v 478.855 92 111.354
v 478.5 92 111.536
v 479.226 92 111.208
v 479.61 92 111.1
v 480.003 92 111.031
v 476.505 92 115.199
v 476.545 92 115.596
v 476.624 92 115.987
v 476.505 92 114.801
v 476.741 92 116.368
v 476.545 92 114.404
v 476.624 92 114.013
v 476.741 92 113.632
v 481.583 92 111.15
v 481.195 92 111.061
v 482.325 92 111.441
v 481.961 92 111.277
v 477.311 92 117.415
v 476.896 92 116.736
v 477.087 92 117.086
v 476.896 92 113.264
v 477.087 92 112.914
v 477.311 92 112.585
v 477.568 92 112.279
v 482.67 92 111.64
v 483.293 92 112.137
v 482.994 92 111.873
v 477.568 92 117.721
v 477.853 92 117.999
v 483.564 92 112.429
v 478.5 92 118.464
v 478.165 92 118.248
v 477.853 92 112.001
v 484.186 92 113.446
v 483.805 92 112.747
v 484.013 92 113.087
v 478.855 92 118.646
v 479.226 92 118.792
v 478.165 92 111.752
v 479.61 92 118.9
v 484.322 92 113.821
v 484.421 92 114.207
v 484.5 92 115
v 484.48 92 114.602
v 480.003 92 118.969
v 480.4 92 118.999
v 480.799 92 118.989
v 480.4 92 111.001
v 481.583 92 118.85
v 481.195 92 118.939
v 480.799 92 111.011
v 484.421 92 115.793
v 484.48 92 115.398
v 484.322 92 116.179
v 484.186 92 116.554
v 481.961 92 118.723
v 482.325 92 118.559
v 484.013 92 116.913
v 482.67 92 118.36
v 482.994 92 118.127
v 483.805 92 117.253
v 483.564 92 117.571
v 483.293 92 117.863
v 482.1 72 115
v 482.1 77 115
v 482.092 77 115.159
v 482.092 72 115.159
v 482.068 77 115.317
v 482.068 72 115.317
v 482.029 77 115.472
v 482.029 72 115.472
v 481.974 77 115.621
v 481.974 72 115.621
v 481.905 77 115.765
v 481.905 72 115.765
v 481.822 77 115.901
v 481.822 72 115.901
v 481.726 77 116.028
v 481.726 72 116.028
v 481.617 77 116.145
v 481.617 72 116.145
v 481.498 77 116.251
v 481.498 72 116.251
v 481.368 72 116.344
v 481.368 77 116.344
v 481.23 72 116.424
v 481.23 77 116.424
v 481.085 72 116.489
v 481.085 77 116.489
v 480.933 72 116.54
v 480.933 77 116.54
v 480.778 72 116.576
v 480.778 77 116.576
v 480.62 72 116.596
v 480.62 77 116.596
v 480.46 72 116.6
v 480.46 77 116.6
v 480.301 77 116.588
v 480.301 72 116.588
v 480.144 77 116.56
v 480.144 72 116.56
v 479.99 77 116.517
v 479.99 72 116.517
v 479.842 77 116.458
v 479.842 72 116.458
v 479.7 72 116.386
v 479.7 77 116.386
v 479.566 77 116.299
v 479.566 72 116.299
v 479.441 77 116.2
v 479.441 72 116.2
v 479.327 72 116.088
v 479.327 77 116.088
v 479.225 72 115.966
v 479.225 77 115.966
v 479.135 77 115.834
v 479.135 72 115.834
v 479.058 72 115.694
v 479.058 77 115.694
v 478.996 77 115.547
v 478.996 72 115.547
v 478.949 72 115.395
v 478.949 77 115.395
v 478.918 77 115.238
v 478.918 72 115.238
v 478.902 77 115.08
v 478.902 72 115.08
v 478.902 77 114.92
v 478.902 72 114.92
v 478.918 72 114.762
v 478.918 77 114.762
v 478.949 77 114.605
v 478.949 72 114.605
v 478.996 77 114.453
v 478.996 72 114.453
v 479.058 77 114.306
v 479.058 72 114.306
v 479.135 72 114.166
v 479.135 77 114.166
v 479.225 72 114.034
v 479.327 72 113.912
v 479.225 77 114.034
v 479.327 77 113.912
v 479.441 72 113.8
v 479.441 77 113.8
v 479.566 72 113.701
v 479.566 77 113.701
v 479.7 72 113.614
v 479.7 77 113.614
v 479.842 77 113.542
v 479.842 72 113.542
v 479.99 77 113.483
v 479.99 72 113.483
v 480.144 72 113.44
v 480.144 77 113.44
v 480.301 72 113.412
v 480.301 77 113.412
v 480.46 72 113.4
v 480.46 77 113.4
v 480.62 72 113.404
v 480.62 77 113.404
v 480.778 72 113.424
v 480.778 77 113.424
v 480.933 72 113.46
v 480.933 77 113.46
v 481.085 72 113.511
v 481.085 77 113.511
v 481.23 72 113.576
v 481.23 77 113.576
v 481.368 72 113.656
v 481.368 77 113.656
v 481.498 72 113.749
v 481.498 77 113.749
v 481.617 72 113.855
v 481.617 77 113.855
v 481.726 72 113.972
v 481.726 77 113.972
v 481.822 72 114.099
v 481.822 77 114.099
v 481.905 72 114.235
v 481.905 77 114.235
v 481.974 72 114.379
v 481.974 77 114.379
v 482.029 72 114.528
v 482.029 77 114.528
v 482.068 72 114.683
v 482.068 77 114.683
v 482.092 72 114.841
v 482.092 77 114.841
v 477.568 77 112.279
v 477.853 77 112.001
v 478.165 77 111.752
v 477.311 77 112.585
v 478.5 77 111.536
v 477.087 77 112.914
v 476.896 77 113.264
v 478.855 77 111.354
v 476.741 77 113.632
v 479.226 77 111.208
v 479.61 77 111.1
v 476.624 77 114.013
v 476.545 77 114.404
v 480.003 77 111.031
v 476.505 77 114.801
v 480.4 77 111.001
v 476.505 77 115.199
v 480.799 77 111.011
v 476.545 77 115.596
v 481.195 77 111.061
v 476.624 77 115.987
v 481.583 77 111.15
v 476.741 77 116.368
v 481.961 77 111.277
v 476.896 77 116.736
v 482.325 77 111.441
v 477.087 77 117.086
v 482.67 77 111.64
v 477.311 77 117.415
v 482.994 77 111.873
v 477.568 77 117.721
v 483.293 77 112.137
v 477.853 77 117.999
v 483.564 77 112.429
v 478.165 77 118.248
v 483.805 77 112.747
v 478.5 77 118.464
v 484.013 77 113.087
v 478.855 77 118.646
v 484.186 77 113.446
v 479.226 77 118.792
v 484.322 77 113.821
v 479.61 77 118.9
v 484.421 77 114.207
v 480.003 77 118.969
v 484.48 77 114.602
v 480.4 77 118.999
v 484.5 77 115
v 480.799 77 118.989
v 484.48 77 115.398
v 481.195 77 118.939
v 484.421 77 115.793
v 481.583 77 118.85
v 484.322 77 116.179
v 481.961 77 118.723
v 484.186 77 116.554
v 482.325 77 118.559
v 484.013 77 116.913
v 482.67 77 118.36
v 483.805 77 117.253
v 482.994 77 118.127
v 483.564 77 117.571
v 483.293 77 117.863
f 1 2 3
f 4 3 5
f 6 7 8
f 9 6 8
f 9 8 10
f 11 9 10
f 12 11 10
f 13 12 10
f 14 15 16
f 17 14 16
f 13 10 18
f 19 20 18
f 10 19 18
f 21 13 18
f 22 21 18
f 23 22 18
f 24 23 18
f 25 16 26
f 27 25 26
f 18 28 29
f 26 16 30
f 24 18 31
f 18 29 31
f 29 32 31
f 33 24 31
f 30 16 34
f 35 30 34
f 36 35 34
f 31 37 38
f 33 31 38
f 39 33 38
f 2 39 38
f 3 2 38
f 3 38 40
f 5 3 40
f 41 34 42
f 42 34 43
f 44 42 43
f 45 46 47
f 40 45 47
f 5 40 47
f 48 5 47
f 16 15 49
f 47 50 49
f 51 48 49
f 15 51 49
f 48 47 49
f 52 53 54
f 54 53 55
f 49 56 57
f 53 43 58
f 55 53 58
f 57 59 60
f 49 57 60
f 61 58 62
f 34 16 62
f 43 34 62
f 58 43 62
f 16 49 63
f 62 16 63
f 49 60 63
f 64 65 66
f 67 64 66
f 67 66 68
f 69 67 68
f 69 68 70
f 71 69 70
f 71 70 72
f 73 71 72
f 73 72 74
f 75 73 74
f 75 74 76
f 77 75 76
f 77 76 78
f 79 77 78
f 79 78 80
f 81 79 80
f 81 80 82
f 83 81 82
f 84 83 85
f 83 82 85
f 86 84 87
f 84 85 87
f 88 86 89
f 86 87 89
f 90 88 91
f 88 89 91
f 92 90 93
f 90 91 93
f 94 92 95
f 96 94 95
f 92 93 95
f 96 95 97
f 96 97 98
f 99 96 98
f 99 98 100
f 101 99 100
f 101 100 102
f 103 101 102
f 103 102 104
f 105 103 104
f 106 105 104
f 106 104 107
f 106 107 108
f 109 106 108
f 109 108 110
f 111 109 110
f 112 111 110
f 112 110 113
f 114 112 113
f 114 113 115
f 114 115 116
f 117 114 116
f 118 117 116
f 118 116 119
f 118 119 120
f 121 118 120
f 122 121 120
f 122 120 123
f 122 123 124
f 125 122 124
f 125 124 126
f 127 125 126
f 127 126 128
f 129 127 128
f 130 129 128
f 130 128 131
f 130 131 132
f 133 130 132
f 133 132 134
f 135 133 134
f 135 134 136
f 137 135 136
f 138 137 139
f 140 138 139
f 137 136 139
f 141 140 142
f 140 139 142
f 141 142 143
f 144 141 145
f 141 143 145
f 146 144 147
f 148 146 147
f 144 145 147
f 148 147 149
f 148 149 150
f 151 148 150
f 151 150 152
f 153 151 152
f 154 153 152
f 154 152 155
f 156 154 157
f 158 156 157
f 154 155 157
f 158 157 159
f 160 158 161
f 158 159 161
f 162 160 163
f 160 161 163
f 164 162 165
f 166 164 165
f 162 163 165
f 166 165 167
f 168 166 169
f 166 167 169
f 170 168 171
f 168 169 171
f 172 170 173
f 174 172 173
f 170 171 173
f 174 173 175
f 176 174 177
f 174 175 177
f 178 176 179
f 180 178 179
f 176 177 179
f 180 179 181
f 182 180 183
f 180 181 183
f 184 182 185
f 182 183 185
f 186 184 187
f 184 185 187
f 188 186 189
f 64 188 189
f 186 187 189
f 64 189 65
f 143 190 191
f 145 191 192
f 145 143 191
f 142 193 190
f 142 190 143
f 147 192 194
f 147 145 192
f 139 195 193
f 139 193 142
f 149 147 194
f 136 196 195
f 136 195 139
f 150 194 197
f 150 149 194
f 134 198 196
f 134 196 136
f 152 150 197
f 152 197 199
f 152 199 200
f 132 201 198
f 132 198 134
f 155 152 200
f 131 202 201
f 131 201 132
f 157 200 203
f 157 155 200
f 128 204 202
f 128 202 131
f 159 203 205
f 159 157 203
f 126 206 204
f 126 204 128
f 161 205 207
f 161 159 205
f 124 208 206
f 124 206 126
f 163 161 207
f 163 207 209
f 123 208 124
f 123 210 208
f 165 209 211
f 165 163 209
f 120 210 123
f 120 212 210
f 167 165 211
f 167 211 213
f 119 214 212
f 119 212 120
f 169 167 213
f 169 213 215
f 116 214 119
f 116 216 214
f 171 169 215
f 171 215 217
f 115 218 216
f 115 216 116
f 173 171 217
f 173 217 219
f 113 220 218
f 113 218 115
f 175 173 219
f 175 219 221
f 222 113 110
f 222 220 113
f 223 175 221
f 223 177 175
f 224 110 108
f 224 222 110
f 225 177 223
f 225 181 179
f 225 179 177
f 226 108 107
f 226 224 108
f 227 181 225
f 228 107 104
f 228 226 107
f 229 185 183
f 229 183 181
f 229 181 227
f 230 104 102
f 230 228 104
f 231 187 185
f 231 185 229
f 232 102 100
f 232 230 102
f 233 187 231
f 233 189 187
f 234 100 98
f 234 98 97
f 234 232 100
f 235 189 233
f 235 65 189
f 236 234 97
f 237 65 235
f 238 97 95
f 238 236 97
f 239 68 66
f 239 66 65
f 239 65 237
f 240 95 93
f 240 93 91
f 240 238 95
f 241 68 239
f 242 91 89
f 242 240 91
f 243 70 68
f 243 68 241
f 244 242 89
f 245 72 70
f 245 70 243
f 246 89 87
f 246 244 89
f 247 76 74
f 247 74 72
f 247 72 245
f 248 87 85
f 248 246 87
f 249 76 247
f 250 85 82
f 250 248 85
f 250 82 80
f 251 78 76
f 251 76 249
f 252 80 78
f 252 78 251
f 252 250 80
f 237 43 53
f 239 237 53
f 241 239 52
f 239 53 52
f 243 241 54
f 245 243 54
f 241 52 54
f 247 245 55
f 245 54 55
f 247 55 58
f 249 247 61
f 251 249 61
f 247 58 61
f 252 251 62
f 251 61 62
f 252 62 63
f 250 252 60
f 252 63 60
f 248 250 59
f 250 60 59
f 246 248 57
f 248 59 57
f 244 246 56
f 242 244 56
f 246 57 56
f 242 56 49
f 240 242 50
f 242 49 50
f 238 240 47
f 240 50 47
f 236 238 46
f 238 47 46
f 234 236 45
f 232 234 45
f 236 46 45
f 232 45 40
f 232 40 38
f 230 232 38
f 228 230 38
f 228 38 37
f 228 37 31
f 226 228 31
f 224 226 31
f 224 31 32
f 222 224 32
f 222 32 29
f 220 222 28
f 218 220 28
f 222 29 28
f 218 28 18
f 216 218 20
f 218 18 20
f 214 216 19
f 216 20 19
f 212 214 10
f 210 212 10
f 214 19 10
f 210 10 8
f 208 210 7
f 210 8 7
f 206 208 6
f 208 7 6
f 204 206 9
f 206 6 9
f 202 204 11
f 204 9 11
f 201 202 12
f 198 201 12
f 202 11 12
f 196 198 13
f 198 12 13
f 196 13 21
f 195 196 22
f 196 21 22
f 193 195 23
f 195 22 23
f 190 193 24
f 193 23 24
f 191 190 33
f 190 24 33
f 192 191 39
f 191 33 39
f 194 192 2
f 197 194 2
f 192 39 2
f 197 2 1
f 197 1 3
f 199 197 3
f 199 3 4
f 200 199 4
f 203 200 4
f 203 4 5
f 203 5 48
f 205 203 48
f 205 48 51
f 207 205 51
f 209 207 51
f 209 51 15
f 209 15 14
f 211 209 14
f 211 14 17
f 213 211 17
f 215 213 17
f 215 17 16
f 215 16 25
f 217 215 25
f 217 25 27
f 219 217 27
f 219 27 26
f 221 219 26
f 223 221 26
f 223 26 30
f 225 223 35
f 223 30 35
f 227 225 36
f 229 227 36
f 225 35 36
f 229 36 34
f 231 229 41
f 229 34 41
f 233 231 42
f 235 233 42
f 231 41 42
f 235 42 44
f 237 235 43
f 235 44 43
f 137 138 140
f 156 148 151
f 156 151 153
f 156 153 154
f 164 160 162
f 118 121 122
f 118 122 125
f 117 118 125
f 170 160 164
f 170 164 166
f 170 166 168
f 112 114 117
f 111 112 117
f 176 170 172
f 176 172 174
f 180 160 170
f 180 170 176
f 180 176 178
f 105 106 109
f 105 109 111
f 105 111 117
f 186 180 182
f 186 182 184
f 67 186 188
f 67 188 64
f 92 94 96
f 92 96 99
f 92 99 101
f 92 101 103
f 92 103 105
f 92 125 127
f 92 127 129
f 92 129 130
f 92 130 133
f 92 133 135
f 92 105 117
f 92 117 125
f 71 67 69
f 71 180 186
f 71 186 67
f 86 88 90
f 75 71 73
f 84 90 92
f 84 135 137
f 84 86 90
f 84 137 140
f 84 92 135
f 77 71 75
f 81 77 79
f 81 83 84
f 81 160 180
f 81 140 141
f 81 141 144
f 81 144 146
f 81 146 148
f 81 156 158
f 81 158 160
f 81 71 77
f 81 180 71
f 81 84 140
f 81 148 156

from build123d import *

# Parameters (mm, degrees)
CYLINDER1217_R     = 1.6
CYLINDER1217_DEPTH = 15
CYLINDER1202_R     = 4
CYLINDER1202_DEPTH = 15


with BuildPart() as cylinder1217:
    # Cylinder1217 → Cylinder1217 (new body)
    with BuildSketch(Plane(origin=(480, 87, 115), x_dir=(1, 0, 0), z_dir=(0, -1, 0))):
        Circle(CYLINDER1217_R)
    extrude(amount=CYLINDER1217_DEPTH)


with BuildPart() as fusion248002050129:
    # Cylinder1202 → Cylinder1202 (new body)
    with BuildSketch(Plane(origin=(480, 92, 115), x_dir=(1, 0, 0), z_dir=(0, -1, 0))):
        Circle(CYLINDER1202_R)
    extrude(amount=CYLINDER1202_DEPTH)

    # Fusion248002050129: union Cylinder1217
    add(cylinder1217.part)


with BuildPart() as fusion248002050129_1:
    # Fusion248002050129 placement: moved
    add(fusion248002050129.part.moved(Location((0.5, 0, 0))))


solid = fusion248002050129_1.part
